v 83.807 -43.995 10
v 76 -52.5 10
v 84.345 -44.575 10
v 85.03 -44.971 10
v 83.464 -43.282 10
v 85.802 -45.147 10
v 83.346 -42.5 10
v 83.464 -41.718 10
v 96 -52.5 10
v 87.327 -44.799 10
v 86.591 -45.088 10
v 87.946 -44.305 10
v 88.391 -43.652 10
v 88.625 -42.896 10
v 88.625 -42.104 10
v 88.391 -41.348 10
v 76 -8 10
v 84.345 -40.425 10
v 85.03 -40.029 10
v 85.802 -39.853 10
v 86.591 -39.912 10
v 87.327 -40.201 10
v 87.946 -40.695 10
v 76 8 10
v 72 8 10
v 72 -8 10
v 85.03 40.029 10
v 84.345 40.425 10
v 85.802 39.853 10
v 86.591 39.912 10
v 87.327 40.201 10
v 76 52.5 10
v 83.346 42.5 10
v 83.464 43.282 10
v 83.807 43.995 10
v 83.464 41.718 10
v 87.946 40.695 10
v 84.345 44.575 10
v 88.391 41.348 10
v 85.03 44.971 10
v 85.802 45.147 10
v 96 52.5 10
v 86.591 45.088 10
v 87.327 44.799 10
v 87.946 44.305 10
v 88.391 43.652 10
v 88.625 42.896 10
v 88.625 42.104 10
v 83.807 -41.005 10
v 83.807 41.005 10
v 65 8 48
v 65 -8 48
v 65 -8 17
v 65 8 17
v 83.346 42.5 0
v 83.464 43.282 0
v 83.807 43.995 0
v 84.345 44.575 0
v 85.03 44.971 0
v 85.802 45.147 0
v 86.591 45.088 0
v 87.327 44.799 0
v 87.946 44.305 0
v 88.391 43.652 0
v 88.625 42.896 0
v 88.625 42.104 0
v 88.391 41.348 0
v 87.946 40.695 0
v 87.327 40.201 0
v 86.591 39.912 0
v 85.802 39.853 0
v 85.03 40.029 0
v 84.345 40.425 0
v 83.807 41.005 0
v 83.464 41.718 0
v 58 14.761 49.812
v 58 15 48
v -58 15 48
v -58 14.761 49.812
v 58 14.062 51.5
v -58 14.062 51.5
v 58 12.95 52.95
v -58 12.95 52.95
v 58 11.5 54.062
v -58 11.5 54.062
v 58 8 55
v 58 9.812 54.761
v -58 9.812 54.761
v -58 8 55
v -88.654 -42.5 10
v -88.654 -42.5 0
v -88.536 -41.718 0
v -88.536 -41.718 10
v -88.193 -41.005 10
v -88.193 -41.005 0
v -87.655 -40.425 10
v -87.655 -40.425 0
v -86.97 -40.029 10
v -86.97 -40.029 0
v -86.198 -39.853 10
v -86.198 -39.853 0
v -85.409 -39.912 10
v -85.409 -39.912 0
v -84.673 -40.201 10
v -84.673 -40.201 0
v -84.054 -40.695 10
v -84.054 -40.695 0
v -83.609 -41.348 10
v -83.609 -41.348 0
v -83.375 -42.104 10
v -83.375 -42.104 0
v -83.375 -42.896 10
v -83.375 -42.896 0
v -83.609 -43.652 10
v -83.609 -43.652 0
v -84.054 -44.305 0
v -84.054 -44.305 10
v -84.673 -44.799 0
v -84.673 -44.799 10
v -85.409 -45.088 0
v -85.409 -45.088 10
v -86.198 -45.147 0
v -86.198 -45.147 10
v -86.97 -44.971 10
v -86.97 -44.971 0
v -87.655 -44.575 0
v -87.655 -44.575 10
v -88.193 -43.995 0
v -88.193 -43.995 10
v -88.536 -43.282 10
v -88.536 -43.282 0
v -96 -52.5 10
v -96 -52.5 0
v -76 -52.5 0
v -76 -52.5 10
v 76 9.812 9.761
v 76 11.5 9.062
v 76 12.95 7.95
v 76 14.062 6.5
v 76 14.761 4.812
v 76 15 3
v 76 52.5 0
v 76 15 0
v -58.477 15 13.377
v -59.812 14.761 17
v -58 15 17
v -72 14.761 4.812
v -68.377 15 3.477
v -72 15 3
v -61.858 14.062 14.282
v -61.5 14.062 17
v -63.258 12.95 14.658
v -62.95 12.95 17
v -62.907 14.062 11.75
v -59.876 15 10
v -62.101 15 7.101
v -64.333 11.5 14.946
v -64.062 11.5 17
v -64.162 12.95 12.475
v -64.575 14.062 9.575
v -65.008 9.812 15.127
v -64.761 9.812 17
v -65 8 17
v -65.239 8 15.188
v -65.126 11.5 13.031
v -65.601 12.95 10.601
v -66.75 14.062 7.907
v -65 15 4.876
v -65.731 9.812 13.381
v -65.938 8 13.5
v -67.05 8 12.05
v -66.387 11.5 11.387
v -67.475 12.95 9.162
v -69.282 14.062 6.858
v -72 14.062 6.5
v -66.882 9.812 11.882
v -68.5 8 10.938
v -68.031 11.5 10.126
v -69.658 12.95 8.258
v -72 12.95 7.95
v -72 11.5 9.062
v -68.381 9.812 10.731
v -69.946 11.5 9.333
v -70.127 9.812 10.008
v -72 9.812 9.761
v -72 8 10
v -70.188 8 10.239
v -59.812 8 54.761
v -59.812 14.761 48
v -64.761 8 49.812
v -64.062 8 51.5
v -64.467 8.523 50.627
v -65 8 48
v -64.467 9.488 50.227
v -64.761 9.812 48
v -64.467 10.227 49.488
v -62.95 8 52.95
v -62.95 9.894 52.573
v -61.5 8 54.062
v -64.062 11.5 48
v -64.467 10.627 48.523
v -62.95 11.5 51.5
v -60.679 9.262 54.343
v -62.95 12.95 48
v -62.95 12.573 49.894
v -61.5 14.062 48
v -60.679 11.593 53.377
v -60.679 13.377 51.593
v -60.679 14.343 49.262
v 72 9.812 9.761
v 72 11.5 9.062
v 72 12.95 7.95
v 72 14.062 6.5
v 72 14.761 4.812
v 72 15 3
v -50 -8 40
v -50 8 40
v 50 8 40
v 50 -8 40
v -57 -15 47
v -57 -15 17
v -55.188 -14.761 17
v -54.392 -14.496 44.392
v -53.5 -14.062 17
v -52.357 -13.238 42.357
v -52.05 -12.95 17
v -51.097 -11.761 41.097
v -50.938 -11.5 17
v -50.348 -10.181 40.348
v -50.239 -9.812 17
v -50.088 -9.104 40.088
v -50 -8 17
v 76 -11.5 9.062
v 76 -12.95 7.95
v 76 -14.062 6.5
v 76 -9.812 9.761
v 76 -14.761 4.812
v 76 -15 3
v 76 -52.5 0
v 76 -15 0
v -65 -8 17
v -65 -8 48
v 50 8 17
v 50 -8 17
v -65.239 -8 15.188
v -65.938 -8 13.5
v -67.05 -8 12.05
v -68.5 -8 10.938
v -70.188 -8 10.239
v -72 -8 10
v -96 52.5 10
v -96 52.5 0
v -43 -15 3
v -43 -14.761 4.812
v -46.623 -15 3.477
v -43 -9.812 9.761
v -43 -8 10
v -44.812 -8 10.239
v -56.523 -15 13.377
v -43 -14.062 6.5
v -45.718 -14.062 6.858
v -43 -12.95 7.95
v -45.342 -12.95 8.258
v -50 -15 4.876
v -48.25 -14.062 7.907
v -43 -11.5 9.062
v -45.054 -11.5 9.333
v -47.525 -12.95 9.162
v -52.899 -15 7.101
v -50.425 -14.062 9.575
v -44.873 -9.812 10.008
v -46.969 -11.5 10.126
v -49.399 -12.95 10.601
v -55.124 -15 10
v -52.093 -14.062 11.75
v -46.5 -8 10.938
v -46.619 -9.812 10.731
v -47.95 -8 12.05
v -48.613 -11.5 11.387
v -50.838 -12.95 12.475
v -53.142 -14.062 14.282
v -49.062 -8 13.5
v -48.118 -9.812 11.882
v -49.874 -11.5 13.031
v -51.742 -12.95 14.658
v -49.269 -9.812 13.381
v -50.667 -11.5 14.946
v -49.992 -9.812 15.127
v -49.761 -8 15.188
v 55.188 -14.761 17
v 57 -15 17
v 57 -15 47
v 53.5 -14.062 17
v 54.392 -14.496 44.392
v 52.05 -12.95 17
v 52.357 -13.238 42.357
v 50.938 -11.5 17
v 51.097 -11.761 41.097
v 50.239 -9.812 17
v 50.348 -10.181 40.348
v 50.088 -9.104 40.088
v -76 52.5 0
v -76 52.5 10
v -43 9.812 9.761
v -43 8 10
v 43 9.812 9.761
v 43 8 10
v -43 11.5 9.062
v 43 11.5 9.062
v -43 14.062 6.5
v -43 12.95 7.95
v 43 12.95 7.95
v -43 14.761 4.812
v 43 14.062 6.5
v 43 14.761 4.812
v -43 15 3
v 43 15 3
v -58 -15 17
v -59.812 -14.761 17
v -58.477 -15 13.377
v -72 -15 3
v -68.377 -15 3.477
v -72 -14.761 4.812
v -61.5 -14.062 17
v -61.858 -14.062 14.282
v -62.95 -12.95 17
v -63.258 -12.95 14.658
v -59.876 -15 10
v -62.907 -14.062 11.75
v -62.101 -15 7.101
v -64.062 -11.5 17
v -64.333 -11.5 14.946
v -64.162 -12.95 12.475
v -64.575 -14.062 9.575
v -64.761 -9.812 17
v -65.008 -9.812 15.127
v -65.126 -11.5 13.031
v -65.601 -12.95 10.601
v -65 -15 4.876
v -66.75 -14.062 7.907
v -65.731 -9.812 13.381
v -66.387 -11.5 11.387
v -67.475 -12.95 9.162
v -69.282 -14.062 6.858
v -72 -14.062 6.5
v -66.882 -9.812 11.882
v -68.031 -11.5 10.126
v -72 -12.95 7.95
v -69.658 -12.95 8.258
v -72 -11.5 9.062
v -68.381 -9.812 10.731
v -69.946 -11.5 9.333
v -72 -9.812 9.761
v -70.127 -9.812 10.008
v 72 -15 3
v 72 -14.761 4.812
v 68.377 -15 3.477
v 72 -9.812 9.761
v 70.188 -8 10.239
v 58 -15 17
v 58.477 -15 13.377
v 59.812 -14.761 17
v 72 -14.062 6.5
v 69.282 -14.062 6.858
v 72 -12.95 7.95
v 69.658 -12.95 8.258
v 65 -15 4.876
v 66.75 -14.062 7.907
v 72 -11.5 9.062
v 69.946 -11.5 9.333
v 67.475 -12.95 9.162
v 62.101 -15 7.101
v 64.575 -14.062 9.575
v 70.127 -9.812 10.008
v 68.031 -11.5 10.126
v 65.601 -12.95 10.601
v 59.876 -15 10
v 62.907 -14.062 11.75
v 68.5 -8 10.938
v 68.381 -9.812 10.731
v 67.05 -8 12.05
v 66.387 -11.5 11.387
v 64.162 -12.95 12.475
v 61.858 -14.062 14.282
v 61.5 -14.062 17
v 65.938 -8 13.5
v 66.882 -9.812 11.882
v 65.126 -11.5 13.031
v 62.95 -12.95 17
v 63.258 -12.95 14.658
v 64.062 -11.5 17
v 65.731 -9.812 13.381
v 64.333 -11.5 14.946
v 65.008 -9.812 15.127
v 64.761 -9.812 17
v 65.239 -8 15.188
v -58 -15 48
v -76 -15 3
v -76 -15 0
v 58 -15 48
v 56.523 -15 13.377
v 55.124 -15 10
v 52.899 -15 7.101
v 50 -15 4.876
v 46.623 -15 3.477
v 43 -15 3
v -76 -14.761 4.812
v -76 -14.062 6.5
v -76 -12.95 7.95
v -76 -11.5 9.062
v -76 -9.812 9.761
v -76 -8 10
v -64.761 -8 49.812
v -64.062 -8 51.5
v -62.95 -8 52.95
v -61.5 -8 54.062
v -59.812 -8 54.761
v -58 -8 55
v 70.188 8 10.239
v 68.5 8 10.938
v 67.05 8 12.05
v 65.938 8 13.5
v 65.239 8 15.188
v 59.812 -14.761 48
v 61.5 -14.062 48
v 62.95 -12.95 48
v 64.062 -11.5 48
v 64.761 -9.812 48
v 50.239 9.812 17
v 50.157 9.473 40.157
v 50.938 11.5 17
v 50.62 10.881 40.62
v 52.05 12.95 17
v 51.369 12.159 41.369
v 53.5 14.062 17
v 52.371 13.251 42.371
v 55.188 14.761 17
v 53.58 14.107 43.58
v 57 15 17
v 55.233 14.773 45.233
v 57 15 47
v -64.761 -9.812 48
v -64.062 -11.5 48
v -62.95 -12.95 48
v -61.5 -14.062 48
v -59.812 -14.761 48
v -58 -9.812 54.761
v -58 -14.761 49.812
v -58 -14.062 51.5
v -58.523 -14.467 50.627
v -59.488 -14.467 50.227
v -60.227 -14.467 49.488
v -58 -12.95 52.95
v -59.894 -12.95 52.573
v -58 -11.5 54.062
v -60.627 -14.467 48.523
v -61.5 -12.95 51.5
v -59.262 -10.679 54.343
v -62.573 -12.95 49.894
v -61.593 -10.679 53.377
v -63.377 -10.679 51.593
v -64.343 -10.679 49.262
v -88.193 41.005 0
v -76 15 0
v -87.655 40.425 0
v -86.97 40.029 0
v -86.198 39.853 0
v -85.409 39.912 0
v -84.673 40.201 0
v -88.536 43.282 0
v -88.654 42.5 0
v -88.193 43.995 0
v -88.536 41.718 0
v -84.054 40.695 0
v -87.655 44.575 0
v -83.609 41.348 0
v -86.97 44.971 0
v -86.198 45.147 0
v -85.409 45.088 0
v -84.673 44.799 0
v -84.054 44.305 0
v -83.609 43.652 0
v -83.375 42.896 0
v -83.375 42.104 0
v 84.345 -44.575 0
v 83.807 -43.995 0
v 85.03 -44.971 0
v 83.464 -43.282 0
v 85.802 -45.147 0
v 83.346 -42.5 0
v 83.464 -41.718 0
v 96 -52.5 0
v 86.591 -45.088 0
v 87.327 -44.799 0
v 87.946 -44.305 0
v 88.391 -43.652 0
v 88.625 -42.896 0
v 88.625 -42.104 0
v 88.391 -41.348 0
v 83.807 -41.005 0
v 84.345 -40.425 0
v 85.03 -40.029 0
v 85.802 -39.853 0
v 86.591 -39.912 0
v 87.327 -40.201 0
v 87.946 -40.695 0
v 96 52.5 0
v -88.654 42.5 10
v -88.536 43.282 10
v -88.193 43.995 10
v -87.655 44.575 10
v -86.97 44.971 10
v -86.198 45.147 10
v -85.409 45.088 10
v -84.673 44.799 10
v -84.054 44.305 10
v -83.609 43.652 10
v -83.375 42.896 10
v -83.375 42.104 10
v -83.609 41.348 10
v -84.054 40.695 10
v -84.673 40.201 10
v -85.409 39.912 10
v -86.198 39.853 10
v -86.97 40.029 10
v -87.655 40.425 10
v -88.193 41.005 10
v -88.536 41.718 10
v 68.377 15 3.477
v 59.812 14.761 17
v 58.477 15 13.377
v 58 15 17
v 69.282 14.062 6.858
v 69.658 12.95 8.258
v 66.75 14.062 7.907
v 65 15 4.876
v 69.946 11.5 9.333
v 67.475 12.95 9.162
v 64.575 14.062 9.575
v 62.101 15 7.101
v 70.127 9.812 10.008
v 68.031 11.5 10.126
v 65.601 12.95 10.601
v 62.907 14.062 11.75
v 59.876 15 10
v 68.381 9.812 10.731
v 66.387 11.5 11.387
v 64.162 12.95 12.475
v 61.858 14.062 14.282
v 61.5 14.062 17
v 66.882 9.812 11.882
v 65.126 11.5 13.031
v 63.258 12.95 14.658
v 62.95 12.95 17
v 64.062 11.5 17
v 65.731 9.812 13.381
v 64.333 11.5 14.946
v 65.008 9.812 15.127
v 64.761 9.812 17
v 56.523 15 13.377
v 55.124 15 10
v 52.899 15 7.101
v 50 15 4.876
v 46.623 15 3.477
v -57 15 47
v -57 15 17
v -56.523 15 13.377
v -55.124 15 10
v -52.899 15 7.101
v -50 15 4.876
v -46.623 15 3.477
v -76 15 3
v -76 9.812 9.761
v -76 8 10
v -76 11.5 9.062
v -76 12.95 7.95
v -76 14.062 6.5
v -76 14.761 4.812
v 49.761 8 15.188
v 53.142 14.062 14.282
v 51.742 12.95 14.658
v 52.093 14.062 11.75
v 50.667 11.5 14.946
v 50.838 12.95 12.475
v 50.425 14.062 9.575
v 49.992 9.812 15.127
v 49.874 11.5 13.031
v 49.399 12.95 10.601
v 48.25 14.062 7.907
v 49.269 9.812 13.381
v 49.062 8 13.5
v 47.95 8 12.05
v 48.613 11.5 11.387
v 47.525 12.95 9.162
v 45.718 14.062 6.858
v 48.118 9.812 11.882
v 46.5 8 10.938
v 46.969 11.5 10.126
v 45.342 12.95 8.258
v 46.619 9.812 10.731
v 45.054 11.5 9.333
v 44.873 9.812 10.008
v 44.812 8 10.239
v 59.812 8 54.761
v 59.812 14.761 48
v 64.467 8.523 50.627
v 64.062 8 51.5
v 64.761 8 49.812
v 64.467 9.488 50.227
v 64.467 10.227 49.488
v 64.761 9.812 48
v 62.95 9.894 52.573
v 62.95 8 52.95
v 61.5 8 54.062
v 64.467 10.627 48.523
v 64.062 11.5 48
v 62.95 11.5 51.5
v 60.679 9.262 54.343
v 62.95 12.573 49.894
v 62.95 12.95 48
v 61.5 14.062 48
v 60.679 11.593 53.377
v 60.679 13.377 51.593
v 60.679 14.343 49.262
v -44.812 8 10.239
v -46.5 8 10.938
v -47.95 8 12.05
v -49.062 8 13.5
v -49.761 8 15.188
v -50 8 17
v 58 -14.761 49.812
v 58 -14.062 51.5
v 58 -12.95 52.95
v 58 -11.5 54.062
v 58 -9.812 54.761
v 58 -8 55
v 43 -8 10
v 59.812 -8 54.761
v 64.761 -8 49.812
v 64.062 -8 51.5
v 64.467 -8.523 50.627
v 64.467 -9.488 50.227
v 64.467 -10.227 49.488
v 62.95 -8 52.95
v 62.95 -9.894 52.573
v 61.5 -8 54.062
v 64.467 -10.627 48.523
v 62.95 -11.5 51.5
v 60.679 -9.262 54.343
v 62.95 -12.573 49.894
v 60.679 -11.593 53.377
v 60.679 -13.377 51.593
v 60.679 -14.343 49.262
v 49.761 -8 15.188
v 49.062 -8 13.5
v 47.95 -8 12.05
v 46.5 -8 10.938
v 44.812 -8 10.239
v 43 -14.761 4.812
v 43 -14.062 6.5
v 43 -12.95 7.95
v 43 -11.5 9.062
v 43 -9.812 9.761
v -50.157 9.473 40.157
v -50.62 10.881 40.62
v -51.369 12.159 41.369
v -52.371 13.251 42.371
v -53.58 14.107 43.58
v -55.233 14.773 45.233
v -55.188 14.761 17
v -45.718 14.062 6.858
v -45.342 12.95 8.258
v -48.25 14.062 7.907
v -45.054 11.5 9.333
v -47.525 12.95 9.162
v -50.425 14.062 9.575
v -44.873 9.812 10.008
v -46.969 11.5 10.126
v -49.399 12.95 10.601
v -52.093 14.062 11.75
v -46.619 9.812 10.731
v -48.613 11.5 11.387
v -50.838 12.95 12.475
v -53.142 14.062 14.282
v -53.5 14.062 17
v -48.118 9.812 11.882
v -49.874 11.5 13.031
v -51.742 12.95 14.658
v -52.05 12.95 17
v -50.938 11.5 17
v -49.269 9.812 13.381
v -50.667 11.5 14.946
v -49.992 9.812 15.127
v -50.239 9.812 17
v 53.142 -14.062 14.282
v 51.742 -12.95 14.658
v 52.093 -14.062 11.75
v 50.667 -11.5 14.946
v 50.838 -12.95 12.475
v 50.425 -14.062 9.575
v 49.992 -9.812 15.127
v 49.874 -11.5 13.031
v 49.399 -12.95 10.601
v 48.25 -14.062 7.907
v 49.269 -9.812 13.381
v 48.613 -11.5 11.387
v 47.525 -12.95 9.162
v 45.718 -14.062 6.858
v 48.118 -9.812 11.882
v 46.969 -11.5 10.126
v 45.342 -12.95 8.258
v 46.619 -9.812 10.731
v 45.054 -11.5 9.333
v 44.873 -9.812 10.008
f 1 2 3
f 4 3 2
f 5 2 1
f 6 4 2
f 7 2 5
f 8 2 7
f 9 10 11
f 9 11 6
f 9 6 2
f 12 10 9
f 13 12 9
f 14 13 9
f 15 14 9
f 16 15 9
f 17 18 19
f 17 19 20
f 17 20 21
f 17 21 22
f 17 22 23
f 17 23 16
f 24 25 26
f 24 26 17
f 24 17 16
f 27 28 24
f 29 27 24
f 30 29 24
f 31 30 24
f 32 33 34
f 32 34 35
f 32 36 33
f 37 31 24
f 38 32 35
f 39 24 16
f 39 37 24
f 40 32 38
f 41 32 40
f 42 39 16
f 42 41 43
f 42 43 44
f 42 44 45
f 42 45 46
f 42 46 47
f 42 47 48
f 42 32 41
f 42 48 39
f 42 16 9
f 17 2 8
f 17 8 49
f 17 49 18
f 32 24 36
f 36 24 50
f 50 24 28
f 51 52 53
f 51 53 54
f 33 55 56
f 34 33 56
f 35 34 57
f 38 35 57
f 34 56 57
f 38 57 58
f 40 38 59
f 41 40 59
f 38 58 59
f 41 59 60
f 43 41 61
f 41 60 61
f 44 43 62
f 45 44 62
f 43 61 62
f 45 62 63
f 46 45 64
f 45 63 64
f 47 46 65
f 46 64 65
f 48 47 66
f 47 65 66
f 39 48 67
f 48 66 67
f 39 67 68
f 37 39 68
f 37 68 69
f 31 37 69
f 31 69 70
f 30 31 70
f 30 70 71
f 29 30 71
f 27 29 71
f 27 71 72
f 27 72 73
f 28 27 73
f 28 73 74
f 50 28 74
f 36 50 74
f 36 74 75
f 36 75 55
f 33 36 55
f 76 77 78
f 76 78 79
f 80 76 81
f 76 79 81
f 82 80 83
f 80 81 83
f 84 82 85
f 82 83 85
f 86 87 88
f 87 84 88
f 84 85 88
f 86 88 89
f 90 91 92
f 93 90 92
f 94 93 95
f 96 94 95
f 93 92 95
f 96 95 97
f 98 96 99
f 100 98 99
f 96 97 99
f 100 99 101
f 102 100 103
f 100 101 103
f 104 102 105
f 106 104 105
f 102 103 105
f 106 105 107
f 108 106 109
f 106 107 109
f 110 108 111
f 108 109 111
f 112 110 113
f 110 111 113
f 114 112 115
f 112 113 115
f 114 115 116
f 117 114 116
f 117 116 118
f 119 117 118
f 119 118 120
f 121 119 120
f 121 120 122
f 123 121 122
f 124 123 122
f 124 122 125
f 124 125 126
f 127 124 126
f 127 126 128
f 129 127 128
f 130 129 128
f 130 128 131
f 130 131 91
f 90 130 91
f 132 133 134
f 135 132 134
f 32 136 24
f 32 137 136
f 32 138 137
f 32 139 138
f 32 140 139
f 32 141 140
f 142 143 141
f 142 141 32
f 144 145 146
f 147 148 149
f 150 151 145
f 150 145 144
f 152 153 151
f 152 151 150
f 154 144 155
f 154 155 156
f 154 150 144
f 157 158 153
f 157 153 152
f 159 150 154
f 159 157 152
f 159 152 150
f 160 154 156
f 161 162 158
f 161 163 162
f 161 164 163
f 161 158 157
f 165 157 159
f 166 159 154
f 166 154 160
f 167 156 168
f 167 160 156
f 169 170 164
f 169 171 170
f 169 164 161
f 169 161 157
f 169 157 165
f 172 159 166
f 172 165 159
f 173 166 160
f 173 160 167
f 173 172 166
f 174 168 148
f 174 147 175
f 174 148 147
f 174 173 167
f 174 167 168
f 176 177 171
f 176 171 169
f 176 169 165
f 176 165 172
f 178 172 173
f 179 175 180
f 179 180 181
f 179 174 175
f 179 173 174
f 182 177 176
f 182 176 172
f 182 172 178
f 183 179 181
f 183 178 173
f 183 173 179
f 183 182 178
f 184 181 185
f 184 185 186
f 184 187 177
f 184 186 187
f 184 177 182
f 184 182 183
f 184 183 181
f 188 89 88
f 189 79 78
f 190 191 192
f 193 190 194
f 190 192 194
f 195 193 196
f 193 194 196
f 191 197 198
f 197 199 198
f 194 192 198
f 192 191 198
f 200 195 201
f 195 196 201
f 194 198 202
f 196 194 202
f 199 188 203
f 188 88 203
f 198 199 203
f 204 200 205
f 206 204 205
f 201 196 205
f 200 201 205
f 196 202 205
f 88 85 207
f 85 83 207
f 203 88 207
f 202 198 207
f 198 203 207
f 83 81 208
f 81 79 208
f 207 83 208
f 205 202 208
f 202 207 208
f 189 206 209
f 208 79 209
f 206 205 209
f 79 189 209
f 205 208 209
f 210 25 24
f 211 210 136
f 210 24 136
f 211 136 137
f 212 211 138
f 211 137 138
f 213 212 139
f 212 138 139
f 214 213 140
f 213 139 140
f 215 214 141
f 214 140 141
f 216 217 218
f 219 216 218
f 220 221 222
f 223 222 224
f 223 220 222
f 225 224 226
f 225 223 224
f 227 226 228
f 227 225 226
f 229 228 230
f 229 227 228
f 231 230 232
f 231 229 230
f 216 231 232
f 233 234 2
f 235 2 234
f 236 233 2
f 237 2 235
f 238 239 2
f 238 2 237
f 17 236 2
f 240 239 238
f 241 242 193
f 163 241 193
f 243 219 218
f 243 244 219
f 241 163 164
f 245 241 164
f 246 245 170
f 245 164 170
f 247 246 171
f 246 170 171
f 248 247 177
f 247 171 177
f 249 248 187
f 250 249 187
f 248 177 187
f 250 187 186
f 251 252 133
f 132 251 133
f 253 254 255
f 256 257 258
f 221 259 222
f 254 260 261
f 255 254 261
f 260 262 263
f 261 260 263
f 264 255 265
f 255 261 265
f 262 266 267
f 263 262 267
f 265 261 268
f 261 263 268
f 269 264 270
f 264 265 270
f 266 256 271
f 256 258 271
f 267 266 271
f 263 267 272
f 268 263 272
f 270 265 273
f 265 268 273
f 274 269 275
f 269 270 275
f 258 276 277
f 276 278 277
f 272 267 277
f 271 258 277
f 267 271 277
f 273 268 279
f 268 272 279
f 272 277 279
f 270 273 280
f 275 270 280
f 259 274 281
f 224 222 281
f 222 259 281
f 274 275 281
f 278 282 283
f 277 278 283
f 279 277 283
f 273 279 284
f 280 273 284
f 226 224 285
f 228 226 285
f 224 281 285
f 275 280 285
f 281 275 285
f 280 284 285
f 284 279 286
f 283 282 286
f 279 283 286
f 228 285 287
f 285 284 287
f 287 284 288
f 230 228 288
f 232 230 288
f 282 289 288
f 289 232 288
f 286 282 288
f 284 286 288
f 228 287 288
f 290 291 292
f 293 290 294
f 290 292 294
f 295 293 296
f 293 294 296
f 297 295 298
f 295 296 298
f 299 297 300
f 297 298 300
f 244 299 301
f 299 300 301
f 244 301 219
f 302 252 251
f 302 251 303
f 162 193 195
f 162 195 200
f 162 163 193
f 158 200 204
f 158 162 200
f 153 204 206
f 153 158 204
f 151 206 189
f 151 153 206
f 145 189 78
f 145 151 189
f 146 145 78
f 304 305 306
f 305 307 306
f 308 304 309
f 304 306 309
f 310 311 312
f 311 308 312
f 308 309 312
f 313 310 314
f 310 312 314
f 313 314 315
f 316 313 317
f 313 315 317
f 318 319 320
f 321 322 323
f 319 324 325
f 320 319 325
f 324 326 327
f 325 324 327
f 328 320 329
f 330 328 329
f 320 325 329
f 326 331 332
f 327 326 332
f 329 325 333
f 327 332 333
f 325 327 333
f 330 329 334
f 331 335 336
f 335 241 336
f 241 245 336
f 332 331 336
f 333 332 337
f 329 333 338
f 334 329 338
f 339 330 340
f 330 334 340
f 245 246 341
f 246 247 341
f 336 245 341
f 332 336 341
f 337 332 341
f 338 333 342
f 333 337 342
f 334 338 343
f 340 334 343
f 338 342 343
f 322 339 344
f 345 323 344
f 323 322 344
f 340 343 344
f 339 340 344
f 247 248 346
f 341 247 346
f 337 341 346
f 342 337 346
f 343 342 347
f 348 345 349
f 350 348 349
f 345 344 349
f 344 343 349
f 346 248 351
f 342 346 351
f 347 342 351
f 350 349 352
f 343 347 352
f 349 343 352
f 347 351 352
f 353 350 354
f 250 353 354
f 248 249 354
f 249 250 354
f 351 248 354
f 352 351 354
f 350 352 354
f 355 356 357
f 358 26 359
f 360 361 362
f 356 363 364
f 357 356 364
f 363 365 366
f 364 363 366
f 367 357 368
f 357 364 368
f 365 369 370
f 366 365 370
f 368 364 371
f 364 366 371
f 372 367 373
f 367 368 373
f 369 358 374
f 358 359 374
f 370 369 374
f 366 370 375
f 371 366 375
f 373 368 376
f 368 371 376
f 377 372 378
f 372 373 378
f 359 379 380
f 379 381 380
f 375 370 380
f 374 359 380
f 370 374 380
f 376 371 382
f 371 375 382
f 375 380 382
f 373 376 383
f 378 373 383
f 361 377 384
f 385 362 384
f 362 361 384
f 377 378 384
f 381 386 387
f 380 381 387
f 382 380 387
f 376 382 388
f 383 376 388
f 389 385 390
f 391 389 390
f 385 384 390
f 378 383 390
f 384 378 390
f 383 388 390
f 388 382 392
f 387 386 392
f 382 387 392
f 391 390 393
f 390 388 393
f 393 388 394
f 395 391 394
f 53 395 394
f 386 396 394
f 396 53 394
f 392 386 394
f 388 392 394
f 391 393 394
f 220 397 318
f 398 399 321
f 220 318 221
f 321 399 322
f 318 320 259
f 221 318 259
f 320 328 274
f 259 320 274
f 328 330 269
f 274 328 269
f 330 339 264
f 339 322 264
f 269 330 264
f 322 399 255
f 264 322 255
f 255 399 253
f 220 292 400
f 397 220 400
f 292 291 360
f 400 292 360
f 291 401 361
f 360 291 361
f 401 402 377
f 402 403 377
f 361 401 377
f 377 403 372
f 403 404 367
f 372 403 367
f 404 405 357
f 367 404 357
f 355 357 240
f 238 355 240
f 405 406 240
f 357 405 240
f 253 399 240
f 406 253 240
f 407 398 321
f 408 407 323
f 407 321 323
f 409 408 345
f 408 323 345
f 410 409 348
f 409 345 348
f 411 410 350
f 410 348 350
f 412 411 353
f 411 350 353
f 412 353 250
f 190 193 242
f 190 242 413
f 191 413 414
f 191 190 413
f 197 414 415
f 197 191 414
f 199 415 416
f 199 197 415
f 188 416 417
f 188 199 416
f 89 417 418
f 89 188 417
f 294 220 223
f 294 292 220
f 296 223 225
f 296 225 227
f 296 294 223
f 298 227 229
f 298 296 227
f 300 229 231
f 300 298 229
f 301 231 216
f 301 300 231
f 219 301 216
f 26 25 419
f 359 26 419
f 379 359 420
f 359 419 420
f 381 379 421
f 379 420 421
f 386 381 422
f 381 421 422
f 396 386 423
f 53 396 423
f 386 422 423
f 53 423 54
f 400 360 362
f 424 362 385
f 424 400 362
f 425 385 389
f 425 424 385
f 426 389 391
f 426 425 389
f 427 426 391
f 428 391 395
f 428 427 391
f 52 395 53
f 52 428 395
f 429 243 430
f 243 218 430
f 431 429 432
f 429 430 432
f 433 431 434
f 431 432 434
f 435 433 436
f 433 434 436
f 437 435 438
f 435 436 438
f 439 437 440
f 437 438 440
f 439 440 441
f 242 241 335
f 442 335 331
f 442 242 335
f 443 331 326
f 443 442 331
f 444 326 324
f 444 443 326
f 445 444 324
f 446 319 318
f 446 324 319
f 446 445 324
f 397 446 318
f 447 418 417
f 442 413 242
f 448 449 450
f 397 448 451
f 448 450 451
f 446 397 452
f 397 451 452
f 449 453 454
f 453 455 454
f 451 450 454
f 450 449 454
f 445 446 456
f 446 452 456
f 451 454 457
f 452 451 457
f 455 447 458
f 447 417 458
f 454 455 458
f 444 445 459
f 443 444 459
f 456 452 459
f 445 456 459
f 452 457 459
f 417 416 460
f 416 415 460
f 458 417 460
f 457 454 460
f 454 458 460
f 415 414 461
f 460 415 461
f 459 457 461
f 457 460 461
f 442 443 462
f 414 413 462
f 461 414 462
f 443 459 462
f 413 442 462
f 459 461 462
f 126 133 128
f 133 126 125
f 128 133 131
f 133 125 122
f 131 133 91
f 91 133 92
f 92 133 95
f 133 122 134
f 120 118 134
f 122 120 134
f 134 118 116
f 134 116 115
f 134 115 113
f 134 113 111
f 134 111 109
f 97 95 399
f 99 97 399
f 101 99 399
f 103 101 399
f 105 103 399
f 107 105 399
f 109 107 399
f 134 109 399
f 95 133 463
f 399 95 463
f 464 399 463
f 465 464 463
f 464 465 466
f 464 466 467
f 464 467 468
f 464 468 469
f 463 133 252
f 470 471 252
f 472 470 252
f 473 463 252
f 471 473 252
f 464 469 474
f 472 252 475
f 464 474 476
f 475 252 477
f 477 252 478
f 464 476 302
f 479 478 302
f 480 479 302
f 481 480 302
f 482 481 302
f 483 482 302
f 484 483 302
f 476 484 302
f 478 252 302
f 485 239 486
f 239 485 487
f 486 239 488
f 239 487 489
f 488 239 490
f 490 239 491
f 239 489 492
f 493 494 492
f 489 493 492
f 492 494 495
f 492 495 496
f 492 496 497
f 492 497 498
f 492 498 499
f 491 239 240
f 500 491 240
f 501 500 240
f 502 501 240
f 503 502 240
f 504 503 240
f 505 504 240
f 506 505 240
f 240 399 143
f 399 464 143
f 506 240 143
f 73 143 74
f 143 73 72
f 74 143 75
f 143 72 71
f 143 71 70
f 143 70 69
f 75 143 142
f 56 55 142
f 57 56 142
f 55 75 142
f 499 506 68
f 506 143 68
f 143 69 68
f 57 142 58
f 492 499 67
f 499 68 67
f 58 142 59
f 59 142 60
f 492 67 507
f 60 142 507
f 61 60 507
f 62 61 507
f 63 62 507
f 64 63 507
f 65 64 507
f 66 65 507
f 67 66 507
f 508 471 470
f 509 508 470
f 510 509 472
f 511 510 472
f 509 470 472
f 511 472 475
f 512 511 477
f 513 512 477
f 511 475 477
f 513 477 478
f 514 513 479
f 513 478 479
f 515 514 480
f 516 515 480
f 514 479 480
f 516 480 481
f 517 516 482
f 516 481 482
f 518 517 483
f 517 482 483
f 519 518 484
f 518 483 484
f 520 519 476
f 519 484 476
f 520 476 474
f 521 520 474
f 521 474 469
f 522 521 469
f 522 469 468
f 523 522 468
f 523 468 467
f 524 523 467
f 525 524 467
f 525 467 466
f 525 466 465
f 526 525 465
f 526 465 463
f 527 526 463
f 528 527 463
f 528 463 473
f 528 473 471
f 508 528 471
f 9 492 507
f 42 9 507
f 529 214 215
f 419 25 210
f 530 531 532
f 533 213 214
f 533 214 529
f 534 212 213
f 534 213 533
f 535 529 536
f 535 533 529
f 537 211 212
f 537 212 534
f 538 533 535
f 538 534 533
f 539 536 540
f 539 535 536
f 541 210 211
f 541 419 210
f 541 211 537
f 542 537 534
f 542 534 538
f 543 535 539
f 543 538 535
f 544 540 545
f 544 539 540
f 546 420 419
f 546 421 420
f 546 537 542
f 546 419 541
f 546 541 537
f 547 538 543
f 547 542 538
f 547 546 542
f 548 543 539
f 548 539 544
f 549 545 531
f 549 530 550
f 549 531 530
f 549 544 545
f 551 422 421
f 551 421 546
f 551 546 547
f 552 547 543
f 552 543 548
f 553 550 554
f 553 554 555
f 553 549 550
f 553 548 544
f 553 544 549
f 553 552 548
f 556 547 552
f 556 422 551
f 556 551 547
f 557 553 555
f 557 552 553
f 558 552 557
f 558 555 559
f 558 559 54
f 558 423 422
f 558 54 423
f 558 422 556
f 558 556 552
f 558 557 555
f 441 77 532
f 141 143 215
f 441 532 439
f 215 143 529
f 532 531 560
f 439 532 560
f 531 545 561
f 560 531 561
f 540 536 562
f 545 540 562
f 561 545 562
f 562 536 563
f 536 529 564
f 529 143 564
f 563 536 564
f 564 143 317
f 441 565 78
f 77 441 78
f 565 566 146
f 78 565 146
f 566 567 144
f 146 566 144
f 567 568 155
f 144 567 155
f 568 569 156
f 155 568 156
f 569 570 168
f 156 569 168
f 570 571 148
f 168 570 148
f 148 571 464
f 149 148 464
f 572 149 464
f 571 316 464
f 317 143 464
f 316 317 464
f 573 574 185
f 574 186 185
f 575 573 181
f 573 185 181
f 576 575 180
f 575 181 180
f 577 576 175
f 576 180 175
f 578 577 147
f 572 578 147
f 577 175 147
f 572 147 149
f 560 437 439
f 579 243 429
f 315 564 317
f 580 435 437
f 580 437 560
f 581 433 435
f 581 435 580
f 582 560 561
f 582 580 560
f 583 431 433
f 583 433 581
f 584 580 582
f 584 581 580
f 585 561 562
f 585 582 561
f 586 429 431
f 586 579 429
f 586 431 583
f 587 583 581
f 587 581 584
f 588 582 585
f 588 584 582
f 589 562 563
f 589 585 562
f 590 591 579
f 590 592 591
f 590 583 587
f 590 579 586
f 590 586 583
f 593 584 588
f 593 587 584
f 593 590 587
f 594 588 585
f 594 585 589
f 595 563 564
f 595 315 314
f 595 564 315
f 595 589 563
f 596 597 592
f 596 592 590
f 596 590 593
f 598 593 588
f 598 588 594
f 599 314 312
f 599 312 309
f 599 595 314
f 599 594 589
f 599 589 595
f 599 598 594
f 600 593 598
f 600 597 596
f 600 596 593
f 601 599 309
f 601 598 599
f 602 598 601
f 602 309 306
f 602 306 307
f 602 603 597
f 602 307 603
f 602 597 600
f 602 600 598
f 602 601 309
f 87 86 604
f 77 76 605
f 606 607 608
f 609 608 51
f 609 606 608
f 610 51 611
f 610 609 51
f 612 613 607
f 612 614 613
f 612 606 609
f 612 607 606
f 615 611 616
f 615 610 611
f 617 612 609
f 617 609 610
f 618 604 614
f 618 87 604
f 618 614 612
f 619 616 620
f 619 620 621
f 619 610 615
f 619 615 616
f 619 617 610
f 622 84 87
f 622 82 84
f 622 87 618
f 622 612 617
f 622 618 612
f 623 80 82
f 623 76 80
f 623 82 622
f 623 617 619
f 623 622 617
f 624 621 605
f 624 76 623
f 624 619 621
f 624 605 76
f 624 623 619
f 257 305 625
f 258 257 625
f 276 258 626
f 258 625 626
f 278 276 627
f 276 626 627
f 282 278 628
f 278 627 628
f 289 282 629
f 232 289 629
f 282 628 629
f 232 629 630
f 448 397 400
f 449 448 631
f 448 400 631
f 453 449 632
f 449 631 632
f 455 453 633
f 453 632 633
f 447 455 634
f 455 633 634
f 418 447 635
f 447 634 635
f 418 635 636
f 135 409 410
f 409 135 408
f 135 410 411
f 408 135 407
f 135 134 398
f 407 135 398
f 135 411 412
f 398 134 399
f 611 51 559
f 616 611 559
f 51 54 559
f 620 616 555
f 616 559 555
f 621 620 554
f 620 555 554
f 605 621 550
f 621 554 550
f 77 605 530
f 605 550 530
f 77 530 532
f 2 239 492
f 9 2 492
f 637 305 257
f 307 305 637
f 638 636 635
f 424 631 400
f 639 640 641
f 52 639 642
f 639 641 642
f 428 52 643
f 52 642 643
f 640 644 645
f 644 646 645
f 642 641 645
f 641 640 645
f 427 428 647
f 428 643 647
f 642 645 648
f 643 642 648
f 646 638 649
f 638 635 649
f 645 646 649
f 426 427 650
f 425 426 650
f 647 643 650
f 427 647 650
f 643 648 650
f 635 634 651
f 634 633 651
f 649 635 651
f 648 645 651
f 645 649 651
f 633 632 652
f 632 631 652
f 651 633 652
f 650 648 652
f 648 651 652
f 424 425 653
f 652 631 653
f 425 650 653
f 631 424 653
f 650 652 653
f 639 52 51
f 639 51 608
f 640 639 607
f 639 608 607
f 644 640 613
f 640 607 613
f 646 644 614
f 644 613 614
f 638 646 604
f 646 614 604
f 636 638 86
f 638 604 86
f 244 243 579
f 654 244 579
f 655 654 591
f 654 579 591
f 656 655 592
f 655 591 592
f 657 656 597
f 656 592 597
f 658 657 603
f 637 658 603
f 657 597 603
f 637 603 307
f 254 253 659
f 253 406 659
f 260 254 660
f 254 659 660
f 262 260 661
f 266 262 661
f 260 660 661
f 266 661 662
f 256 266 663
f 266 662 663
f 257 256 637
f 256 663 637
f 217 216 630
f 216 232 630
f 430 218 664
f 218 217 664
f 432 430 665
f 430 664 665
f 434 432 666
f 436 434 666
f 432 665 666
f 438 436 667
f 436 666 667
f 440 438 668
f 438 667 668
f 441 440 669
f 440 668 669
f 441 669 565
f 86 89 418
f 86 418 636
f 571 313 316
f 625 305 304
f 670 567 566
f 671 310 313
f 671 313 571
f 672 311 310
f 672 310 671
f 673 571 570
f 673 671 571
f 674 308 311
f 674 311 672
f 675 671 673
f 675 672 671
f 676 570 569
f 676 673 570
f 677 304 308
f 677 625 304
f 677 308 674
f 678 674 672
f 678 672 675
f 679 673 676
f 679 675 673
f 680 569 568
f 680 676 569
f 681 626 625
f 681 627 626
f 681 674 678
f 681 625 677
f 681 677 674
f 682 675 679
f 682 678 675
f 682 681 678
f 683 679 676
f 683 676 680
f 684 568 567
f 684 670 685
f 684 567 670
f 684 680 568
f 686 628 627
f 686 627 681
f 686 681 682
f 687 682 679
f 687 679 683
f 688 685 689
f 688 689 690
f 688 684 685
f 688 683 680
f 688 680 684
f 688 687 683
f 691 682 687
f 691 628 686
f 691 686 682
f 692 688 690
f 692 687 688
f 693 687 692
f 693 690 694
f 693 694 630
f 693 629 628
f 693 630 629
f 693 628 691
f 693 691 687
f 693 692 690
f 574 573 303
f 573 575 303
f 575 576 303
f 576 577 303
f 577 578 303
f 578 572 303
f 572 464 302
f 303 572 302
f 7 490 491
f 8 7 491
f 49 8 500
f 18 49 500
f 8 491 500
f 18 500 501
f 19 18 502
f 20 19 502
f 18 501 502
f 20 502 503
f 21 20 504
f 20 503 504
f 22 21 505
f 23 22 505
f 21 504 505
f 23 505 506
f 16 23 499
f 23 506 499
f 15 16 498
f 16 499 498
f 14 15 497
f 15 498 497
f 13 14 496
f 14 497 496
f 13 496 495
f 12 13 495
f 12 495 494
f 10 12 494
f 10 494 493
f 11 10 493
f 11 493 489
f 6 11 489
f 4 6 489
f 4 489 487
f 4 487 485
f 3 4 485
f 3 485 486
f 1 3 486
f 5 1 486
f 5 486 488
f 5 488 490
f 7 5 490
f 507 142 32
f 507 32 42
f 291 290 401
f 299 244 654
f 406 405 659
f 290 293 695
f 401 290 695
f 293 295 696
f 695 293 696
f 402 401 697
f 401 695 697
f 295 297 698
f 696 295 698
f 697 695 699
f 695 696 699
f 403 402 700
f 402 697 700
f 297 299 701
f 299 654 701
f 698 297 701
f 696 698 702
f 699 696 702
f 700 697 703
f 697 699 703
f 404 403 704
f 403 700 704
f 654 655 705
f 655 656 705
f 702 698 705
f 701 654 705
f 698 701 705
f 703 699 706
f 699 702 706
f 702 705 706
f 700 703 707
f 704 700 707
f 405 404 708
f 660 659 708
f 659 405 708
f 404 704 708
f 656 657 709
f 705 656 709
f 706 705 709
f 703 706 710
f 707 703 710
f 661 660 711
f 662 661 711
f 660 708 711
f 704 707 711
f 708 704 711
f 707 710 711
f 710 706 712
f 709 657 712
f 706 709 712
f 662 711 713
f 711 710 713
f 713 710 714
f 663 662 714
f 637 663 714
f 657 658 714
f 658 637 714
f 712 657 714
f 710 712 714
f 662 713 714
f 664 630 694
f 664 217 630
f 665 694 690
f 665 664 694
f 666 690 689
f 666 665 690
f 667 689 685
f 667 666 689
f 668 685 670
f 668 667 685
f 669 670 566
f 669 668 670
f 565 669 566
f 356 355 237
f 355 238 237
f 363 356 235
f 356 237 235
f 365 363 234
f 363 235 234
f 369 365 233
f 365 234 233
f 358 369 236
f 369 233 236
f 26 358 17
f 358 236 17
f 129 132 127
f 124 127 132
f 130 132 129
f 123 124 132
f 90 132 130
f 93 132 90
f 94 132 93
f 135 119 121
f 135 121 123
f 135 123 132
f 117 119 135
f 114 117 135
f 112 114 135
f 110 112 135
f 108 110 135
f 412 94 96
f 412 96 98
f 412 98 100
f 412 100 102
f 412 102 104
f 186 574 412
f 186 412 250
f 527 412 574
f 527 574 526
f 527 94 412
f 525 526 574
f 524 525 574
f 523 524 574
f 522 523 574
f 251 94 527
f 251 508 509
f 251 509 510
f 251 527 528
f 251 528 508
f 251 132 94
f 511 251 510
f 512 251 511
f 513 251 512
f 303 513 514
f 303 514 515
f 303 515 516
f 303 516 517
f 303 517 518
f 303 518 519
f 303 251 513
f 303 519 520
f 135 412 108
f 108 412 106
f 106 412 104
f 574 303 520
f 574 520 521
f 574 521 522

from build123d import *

# Parameters (mm, degrees)
SKETCH1_W                  = 20
SKETCH1_H                  = 37.5
SKETCH1_W_2                = 192
SKETCH1_H_2                = 30
BOSS_EXTRUDE1_DEPTH        = 10
F_4_0_209_DIAMETER_HOLE1_D = 5.3086
SKETCH6_W                  = 15
SKETCH6_H                  = 30
BOSS_EXTRUDE2_DEPTH        = 30
BOSS_EXTRUDE3_START        = 30
SKETCH6_3_W                = 100
SKETCH6_3_H                = 30
SKETCH6_3_W_2              = 15
BOSS_EXTRUDE3_DEPTH        = 15
FILLET2_R                  = 7


with BuildPart() as part:
    # Sketch1 → Boss-Extrude1 (new body)
    with BuildSketch(Plane.XY):
        with Locations((-86, 33.75)):
            Rectangle(SKETCH1_W, SKETCH1_H)
        Rectangle(SKETCH1_W_2, SKETCH1_H_2)
        with Locations((-86, -33.75)):
            Rectangle(SKETCH1_W, SKETCH1_H)
        with Locations((86, -33.75)):
            Rectangle(SKETCH1_W, SKETCH1_H)
        with Locations((86, 33.75)):
            Rectangle(SKETCH1_W, SKETCH1_H)
    extrude(amount=BOSS_EXTRUDE1_DEPTH)

    # #4 (0.209) Diameter Hole1 (through all)
    with Locations(Plane.XY.offset(10)):
        with Locations((-86, 42.5), (-86, -42.5), (86, -42.5), (86, 42.5)):
            Hole(F_4_0_209_DIAMETER_HOLE1_D / 2)

    # Sketch6 → Boss-Extrude2 (add)
    with BuildSketch(Plane.XY.offset(10)):
        with Locations((-57.5, 0)):
            Rectangle(SKETCH6_W, SKETCH6_H)
        with Locations((57.5, 0)):
            Rectangle(SKETCH6_W, SKETCH6_H)
    extrude(amount=BOSS_EXTRUDE2_DEPTH)

    # Sketch6<3> → Boss-Extrude3 (add)
    with BuildSketch(Plane.XY.offset(10).offset(BOSS_EXTRUDE3_START)):
        Rectangle(SKETCH6_3_W, SKETCH6_3_H)
        with Locations((-57.5, 0)):
            Rectangle(SKETCH6_3_W_2, SKETCH6_3_H)
        with Locations((57.5, 0)):
            Rectangle(SKETCH6_3_W_2, SKETCH6_3_H)
    extrude(amount=BOSS_EXTRUDE3_DEPTH)

    # Fillet2
    fillet2_edges = [part.edges().sort_by_distance(p)[0] for p in [
        (0, 15, 40),
        (0, -15, 40),
        (0, 15, 55),
        (-65, 0, 55),
        (0, -15, 55),
        (65, 0, 55),
        (-70.5, -15, 10),
        (-70.5, 15, 10),
        (0, -15, 10),
        (70.5, -15, 10),
        (0, 15, 10),
        (70.5, 15, 10),
        (-50, 15, 25),
        (-65, 0, 10),
        (-65, 15, 32.5),
        (-65, -15, 32.5),
        (-50, -15, 25),
        (-50, 0, 10),
        (65, -15, 32.5),
        (65, 15, 32.5),
        (50, 0, 10),
        (50, 15, 25),
        (50, -15, 25),
        (65, 0, 10),
    ]]
    fillet(fillet2_edges, radius=FILLET2_R)


solid = part.part
